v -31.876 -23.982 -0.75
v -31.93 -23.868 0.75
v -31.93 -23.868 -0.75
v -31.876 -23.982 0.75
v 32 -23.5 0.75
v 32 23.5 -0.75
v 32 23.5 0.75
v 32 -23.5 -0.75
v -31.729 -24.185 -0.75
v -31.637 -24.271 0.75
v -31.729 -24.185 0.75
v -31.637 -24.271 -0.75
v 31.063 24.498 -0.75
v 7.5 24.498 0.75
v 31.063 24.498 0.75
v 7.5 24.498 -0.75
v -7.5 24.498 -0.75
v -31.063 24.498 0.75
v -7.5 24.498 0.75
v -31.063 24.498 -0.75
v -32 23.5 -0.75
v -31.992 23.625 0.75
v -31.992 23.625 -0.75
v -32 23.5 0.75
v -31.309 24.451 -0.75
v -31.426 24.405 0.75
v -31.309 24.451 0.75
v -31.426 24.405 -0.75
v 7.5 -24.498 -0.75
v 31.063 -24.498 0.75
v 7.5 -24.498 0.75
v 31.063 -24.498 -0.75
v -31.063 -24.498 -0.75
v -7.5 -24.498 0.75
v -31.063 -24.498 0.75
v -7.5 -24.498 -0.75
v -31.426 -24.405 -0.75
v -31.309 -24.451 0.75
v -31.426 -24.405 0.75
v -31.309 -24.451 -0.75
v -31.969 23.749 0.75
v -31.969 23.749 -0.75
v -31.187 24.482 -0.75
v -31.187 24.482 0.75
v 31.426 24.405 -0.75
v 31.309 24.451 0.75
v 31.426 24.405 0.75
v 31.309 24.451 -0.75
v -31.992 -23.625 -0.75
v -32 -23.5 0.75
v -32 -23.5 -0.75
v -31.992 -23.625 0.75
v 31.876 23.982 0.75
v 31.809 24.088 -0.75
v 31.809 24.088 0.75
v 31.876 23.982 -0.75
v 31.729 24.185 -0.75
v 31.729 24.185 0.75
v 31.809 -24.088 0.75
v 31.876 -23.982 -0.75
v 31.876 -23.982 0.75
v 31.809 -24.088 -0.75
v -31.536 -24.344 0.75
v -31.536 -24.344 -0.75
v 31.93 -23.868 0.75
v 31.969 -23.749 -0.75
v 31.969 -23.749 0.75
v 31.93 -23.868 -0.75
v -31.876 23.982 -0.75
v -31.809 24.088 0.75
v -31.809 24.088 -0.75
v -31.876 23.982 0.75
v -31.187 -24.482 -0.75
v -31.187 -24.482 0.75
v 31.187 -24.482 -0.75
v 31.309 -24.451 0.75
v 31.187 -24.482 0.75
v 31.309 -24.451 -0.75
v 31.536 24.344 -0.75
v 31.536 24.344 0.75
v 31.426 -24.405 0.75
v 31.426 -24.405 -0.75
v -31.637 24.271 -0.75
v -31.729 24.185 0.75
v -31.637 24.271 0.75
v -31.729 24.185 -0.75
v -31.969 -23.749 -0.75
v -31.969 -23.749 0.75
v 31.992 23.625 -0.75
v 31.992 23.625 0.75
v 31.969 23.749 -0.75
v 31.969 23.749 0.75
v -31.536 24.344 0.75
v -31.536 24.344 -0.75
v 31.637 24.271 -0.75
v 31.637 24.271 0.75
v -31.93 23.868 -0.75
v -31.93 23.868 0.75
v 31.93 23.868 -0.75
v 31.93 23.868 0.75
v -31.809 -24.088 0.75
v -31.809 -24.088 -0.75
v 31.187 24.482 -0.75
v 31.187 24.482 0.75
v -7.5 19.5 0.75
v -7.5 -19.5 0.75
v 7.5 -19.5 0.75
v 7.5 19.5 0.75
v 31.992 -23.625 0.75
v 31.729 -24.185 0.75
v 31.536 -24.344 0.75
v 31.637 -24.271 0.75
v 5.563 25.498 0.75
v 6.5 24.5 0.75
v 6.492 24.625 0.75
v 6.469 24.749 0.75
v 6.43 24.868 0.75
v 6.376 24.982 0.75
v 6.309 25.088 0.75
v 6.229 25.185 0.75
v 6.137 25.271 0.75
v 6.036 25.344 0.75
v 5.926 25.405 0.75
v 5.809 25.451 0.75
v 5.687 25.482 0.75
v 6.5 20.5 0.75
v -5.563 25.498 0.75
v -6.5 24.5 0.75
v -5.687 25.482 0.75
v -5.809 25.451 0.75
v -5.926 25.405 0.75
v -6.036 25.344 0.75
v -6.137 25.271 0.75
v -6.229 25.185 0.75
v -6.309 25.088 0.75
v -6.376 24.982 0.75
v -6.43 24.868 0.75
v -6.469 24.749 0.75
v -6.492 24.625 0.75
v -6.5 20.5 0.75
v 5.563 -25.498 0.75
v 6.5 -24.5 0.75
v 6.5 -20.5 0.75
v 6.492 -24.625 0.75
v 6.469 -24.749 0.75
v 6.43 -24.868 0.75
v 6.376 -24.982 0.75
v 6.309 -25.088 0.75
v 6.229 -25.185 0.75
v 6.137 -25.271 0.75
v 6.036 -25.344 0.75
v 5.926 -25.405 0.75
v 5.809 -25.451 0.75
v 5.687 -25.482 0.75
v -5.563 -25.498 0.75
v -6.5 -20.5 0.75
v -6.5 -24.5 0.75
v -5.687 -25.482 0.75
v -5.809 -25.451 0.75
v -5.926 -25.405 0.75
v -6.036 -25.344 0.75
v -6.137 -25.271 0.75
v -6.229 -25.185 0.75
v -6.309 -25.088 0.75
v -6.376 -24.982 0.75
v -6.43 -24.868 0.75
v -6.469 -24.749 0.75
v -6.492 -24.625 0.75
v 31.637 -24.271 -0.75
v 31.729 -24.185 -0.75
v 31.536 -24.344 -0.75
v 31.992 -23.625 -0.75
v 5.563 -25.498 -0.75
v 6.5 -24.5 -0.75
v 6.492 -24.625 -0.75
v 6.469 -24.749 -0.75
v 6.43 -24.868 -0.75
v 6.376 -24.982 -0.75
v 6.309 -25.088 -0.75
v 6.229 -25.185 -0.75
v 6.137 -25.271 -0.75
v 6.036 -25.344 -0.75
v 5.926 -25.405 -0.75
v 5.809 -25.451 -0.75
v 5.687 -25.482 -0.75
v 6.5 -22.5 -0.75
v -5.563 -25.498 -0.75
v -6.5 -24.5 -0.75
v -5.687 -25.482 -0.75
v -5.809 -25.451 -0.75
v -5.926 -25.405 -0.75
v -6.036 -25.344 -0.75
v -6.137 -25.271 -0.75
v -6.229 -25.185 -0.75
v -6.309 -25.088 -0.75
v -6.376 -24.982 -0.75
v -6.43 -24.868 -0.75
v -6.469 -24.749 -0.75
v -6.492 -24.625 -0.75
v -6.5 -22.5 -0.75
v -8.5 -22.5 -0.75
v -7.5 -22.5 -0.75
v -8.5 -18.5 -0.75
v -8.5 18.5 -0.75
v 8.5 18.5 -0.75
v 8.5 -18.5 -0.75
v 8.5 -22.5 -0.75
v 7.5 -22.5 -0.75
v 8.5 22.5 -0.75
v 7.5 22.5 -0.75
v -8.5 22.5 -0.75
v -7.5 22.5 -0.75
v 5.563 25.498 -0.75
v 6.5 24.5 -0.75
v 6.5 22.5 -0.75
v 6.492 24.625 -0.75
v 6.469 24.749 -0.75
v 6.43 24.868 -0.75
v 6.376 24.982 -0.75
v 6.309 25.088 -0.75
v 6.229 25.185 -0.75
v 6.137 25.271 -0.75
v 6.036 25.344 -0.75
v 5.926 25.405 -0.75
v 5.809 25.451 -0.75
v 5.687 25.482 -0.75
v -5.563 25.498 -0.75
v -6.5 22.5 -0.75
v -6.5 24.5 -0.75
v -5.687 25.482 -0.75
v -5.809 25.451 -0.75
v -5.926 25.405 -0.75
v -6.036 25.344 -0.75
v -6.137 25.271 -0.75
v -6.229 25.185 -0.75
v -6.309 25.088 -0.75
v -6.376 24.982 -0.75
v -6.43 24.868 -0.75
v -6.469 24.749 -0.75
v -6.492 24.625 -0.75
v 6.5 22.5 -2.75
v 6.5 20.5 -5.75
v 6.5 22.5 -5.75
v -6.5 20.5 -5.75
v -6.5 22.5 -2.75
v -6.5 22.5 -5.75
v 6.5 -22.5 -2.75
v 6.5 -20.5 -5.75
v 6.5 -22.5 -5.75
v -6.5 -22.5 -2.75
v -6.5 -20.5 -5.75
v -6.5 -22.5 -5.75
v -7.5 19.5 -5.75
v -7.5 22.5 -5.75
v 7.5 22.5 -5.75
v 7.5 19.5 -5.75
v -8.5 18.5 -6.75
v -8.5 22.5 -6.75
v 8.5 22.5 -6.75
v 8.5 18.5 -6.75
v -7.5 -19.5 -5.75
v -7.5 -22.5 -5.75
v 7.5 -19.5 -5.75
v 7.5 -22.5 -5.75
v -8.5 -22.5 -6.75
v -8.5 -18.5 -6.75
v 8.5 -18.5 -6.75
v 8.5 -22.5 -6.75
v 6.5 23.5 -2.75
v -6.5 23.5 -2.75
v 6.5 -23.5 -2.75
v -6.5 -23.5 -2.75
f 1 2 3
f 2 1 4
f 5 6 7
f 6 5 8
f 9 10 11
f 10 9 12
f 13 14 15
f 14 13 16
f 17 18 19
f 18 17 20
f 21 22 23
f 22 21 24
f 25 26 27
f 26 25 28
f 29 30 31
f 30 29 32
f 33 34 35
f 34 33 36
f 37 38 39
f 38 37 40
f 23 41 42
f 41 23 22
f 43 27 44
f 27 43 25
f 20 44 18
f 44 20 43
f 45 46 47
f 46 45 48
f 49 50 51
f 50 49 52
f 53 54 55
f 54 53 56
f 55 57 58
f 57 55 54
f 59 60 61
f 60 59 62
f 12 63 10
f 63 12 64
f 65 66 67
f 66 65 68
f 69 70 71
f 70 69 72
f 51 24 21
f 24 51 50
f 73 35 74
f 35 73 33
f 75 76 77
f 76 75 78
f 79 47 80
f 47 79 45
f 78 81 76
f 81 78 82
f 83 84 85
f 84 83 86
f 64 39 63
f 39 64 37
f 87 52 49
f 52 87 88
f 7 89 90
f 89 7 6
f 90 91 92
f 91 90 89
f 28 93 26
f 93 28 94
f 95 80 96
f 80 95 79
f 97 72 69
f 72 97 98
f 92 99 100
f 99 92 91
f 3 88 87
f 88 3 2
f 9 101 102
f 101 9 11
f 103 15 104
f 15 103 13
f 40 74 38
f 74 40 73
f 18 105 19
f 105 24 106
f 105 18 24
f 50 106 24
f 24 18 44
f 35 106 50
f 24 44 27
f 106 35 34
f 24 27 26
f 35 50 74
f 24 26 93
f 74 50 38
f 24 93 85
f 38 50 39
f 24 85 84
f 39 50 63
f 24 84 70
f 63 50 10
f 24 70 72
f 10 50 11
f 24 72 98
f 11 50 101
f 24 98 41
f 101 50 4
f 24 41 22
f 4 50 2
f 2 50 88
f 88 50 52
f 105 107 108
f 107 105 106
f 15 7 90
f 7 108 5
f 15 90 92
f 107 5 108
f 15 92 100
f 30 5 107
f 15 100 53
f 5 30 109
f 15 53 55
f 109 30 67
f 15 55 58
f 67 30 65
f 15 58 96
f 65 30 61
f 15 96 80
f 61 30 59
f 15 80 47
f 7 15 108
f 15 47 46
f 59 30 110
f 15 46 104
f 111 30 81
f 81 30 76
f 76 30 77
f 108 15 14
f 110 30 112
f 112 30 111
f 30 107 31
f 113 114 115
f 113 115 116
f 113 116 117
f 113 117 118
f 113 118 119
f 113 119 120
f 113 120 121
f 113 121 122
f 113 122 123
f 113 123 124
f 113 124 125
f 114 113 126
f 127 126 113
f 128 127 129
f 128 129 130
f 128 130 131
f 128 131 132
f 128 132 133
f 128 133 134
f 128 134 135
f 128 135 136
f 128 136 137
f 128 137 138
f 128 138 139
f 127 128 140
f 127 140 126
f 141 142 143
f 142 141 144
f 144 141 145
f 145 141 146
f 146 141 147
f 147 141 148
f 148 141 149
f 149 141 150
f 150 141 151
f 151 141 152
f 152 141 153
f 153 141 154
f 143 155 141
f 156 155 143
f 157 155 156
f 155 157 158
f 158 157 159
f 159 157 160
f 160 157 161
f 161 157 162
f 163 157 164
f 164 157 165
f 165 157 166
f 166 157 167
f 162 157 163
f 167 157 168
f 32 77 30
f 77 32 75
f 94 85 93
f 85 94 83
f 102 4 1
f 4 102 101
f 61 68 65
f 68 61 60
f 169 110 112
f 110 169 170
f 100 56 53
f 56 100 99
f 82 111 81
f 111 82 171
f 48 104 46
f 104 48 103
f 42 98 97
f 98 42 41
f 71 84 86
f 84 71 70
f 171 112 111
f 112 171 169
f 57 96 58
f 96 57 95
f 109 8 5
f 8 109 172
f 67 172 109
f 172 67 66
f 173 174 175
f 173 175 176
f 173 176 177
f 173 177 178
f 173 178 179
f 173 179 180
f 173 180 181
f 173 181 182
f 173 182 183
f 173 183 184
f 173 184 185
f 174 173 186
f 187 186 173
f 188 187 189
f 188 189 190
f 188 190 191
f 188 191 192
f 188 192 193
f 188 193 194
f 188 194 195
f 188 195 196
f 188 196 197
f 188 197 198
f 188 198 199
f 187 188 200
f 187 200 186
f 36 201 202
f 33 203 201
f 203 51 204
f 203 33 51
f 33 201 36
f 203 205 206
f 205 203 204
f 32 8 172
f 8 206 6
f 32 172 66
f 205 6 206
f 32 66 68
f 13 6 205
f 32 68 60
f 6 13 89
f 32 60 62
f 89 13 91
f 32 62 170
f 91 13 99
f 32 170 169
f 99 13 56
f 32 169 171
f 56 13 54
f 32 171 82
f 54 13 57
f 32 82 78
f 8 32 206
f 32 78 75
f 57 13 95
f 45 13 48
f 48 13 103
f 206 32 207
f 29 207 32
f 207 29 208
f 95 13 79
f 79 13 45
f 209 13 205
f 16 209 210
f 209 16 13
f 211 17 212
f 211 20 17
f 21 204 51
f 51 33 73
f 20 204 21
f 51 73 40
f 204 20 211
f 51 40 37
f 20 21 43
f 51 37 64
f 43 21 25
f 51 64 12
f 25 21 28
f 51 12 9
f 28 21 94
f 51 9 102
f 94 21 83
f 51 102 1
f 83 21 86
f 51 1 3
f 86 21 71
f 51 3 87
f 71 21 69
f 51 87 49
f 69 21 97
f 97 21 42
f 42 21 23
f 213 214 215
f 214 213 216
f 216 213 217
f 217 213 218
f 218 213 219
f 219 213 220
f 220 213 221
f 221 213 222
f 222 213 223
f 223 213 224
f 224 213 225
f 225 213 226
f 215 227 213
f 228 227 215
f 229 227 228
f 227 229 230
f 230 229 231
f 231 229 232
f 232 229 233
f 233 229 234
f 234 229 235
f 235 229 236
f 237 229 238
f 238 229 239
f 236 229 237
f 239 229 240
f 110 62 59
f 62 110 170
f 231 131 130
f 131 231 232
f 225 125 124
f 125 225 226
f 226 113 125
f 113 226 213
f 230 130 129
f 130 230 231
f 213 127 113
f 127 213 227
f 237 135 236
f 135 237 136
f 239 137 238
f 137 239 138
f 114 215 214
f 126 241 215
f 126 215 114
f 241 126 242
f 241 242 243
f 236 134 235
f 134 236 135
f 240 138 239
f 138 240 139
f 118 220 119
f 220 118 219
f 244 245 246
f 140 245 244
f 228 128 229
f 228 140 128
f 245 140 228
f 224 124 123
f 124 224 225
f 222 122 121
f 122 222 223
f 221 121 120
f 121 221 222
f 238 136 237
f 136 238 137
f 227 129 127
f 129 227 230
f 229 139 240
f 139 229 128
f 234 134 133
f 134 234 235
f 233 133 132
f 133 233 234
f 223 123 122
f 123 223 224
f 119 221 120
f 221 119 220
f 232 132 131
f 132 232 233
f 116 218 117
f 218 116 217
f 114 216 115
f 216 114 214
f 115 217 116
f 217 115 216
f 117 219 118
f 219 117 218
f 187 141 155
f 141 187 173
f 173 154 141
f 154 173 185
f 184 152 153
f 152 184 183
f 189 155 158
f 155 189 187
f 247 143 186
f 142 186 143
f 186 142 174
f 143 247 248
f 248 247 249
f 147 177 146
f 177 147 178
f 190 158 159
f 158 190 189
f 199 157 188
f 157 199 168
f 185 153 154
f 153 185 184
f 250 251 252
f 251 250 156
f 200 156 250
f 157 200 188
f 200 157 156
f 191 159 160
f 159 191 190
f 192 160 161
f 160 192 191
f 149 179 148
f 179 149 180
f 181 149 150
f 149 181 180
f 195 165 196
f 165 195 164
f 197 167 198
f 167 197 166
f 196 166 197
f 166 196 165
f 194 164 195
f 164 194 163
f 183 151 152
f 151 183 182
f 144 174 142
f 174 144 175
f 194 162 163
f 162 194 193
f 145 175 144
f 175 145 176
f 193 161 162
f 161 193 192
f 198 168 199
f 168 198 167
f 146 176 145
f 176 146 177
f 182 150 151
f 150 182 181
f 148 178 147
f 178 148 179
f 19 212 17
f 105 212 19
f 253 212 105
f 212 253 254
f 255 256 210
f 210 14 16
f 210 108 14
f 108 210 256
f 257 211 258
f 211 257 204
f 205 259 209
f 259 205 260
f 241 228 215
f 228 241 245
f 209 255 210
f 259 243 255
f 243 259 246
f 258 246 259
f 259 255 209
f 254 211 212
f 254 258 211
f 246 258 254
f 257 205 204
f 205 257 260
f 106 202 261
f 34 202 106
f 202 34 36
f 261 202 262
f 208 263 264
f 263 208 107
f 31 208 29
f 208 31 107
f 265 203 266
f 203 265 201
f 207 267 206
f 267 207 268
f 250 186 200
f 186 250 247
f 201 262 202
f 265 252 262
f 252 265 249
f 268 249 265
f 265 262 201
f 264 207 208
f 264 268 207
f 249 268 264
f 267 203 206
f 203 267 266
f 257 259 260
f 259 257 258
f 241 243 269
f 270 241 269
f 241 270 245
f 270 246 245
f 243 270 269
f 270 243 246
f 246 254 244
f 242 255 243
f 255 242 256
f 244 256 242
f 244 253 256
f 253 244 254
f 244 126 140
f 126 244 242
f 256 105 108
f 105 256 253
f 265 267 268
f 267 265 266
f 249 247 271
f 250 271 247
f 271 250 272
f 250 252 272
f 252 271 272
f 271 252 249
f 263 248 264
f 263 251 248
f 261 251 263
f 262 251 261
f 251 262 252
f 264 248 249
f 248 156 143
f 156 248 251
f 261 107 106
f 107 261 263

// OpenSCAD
$fa = 0.5; // default minimum facet angle is now 0.5
$fs = 0.5; // default minimum facet size is now 0.5 
$fn = 50;

bay = [60,45];
lip = 2;
//wall = 1.5;
box_wall = 1;

module wedge(d = [1,1,1], center = false) {
    mov = center ? [-d[0]/2,-d[1]/2,0] : [0,0,d[2]]/2;
    
    translate(mov)
    linear_extrude(height = d[2], center=true)
    polygon([[0,0],[d[0],0],[0,d[1]]]);
}

module rounded_cube(d=[1,1,1], center = false, r = 1) {
    mov = center ? [-d[0]/2,-d[1]/2,0] : [0,0,d[2]]/2;
    
    translate(mov)
    hull() {
        translate([r,r,0]) cylinder(d[2], r = r, center = true);
        translate([d[0]-r,r,0]) cylinder(d[2], r = r, center = true);
        translate([r,d[1]-r,0]) cylinder(d[2], r = r, center = true);
        translate([d[0]-r,d[1]-r]) cylinder(d[2], r = r, center = true);
    }
}

space = 1;

module box(solid=false, wall) {
    d = [17,4,wall+6];
    cap = [13, 4, wall];
    rotate([0,180,0])
    difference() {
        union() {
            translate([0,0,d[2]/2]) cube(d, center = true);
            translate([-(d[0]-2*space-2*box_wall)/2,d[1]/2,cap[2]+2])
                rotate([90,0,90])
                    wedge([box_wall,d[2]-box_wall-cap[2]-2,d[0]-2*space-2*box_wall]);
            if (solid) {
                translate([0,-d[1]/2+space/2+box_wall,(d[2]-box_wall)/2-1]) 
                    cube([d[0]-2*box_wall,space,d[2]-box_wall+1], center = true);

                translate([d[0]/2-space/2-box_wall,
                          -space/2+d[1]/2-box_wall+lip,
                          (d[2]-box_wall)/2-1])
                    cube([space,d[1]+lip,d[2]-box_wall+1], center = true);
                translate([-d[0]/2+space/2+box_wall,
                          -space/2+d[1]/2-box_wall+lip,
                          (d[2]-box_wall)/2-1]) 
                    cube([space,d[1]+lip,d[2]-box_wall+1], center = true);
            }

        }
        if (!solid) {
            translate([0,-d[1]/2+space/2+box_wall,(d[2]-box_wall)/2]) 
                cube([d[0]-2*box_wall,space,d[2]-box_wall], center = true);
            translate([d[0]/2-space/2-box_wall,-space/2+d[1]/2-box_wall,(d[2]-box_wall)/2]) 
                cube([space,d[1]-box_wall,d[2]-box_wall], center = true);
            translate([-d[0]/2+space/2+box_wall,-space/2+d[1]/2-box_wall,(d[2]-box_wall)/2]) 
                cube([space,d[1]-box_wall,d[2]-box_wall], center = true);
        }
    }
}

module module_cover(wall) render() {
    d = [17,4,wall+6];
    cap = [13, 4, wall];
    union() {
        difference() {
            union() {
                rounded_cube([bay[0]+2*lip, 
                              bay[1]+2*lip, 
                              wall], center=true);
                translate([0,bay[1]/2+lip-space,wall/2-cap[2]/2]) 
                    rounded_cube(cap, center = true);
                translate([0,-bay[1]/2-lip+space,wall/2-cap[2]/2]) 
                    rounded_cube(cap, center = true);
            }
            translate([0, bay[1]/2-d[1]/2, wall/2]) box(solid=true, wall=wall);
            mirror([0,1,0]) translate([0, bay[1]/2-d[1]/2, wall/2]) box(solid=true, wall=wall);
        }
    
        translate([0, bay[1]/2-d[1]/2,wall/2]) box(wall=wall);
        mirror([0,1,0]) translate([0, bay[1]/2-d[1]/2,wall/2]) box(wall=wall);
    }
}

module_cover(1.5);
